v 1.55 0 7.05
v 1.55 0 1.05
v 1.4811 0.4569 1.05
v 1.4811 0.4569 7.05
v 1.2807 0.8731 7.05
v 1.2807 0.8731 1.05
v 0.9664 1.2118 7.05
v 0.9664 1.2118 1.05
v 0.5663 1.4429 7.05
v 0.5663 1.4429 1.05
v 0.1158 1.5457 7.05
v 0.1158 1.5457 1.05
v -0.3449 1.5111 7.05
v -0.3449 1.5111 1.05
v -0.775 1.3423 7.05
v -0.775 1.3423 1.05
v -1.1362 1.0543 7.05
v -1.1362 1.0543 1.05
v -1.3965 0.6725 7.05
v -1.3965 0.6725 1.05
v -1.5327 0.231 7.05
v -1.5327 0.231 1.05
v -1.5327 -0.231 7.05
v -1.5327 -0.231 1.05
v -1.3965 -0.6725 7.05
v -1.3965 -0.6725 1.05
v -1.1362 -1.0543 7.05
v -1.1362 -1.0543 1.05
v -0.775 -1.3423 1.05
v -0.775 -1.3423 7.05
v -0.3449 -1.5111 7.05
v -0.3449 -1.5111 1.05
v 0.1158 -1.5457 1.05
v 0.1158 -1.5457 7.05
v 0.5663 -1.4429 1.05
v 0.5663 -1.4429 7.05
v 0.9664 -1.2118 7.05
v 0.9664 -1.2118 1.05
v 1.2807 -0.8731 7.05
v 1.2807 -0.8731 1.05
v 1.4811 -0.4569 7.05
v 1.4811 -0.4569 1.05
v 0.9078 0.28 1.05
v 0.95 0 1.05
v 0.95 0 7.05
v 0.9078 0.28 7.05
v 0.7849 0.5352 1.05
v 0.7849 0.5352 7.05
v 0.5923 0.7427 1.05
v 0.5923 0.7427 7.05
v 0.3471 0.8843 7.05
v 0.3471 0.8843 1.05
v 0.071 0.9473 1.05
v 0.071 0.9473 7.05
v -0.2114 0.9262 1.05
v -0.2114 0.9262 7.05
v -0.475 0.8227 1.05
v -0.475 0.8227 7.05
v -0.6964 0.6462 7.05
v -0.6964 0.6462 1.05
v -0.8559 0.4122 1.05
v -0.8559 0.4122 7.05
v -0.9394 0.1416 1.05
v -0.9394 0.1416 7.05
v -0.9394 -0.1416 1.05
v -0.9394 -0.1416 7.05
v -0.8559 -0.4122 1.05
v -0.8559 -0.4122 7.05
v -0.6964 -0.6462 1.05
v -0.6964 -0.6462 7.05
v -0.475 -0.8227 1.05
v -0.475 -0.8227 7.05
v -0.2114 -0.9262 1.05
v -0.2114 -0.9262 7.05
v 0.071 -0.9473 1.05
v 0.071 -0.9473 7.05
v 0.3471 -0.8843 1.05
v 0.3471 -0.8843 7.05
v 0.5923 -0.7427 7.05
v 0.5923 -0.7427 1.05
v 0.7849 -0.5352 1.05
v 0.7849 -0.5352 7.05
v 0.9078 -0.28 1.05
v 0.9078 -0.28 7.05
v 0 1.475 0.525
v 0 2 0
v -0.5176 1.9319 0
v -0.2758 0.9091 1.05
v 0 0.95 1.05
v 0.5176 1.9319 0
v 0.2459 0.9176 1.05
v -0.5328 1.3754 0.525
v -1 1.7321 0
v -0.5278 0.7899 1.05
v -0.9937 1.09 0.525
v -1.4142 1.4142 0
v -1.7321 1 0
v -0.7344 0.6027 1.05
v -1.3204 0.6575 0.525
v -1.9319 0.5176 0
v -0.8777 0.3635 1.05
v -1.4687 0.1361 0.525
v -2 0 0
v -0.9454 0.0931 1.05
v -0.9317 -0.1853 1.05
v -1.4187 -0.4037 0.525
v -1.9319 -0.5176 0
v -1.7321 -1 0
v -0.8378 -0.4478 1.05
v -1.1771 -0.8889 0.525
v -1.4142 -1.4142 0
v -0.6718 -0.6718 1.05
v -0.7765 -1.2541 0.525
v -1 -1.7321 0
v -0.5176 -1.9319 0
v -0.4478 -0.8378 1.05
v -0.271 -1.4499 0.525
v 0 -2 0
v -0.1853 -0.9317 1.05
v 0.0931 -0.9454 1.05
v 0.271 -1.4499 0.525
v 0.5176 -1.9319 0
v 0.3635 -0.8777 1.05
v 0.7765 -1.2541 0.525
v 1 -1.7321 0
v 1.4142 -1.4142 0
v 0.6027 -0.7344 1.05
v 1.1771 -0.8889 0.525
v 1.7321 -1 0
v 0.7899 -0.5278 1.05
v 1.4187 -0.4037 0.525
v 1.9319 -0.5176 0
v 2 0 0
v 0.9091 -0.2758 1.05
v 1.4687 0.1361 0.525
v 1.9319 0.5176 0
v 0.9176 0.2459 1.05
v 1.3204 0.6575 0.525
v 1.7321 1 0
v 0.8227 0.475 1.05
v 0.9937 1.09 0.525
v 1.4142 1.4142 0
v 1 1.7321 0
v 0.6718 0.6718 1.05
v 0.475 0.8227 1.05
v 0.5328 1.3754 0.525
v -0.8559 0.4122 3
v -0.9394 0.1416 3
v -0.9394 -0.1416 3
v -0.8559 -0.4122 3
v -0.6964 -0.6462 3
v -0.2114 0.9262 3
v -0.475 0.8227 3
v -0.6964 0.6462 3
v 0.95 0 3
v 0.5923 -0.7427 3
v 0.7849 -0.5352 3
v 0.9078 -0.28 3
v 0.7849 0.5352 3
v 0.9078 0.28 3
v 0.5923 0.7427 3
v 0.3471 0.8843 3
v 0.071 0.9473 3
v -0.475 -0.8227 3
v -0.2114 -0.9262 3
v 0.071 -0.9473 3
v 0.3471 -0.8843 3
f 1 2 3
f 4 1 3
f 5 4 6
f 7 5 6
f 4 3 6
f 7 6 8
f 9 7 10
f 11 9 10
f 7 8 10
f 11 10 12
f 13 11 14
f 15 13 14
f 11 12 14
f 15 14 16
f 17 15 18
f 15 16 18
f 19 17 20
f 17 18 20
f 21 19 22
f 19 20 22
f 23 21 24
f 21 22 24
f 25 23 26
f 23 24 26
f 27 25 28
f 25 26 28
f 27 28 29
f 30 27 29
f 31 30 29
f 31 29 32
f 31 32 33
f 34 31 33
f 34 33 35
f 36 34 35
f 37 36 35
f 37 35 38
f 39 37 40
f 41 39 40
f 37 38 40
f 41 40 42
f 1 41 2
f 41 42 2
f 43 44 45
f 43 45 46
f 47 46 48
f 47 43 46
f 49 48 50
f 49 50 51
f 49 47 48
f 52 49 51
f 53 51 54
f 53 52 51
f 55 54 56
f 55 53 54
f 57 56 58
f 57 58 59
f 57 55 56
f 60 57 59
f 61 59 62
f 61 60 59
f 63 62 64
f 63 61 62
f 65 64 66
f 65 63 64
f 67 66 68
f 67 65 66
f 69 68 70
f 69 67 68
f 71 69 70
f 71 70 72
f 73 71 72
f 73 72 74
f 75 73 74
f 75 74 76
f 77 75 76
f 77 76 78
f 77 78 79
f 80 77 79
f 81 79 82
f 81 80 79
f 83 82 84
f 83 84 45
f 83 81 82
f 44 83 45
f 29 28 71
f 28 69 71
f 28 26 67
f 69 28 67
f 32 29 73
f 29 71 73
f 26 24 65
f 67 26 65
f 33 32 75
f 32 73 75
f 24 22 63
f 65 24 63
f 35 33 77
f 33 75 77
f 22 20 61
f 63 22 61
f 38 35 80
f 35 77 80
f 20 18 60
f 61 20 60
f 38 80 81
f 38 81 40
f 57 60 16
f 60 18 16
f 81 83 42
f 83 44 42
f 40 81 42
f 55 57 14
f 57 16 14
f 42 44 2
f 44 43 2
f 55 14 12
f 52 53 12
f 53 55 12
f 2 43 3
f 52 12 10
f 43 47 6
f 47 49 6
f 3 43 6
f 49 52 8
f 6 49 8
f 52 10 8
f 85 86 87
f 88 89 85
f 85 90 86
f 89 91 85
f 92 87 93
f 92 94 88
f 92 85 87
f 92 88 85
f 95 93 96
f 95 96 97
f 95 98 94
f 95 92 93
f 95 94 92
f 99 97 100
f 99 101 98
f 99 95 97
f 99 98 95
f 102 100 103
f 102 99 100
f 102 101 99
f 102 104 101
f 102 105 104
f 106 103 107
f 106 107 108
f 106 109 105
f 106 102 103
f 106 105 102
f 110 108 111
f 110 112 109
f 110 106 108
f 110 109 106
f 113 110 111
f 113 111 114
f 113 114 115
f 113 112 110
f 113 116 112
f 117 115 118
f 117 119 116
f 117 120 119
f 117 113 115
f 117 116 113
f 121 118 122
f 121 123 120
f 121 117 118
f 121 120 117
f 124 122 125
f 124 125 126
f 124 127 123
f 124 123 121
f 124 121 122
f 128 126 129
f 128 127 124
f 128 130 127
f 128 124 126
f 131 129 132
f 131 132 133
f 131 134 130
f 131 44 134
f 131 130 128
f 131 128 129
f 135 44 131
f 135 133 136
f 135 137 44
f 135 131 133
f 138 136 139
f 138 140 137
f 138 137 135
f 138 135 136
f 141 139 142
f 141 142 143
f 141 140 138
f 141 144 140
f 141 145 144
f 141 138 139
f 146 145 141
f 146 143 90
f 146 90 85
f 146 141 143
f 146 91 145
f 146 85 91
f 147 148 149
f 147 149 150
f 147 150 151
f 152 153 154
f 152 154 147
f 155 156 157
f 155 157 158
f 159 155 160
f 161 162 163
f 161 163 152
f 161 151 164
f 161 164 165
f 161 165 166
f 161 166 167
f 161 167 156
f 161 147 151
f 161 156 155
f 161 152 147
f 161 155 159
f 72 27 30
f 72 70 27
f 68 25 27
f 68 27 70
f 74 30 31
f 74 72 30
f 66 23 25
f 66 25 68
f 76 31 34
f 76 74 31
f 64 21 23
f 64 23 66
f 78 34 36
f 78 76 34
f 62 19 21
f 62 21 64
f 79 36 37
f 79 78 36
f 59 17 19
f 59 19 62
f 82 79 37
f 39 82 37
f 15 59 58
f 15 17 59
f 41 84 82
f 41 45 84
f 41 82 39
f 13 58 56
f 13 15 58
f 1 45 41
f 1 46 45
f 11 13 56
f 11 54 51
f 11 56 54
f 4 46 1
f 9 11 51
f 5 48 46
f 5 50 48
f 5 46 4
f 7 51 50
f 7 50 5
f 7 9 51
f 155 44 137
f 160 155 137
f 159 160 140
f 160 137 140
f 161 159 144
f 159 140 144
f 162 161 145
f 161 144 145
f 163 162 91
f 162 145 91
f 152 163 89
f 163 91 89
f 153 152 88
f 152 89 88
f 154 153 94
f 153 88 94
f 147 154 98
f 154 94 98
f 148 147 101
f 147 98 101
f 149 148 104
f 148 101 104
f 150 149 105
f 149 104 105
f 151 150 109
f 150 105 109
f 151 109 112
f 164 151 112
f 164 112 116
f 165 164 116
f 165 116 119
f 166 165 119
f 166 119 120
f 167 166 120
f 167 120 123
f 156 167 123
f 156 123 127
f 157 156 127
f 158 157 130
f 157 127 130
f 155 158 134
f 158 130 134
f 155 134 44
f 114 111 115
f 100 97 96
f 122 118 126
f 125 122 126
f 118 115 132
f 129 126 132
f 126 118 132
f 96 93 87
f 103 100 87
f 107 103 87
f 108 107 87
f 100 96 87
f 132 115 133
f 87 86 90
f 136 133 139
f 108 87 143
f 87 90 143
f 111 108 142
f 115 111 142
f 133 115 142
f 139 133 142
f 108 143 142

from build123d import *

# Parameters (mm, degrees)
BOSS_EXTRUDE1_START = -1.05
SKETCH5_R           = 0.95
BOSS_EXTRUDE1_DEPTH = 3
BOSS_EXTRUDE2_START = 0.7
SKETCH7_R           = 1.55
SKETCH7_R_2         = 0.95
BOSS_EXTRUDE2_DEPTH = 6


with BuildPart() as part:
    # Sketch3 → Revolve1 (revolve)
    with BuildSketch(Plane(origin=(0, 0, 0), x_dir=(0, 0, -1), z_dir=(1, 0, 0))):
        Polygon((0, 2), (-1.05, 0.95), (-1.05, 0), (0, 0), align=None)
    revolve(axis=Axis((0, 0, 0), (0, 0, 1)))

    # Sketch5 → Boss-Extrude1 (add)
    with BuildSketch(Plane.XY.offset(1.05).offset(BOSS_EXTRUDE1_START)):
        Circle(SKETCH5_R)
    extrude(amount=BOSS_EXTRUDE1_DEPTH)


with BuildPart() as body_2:
    # Sketch7 → Boss-Extrude2 (new body)
    with BuildSketch(Plane.XY.offset(0.35).offset(BOSS_EXTRUDE2_START)):
        Circle(SKETCH7_R)
        Circle(SKETCH7_R_2, mode=Mode.SUBTRACT)
    extrude(amount=BOSS_EXTRUDE2_DEPTH)


solid = Compound([part.part, body_2.part])
